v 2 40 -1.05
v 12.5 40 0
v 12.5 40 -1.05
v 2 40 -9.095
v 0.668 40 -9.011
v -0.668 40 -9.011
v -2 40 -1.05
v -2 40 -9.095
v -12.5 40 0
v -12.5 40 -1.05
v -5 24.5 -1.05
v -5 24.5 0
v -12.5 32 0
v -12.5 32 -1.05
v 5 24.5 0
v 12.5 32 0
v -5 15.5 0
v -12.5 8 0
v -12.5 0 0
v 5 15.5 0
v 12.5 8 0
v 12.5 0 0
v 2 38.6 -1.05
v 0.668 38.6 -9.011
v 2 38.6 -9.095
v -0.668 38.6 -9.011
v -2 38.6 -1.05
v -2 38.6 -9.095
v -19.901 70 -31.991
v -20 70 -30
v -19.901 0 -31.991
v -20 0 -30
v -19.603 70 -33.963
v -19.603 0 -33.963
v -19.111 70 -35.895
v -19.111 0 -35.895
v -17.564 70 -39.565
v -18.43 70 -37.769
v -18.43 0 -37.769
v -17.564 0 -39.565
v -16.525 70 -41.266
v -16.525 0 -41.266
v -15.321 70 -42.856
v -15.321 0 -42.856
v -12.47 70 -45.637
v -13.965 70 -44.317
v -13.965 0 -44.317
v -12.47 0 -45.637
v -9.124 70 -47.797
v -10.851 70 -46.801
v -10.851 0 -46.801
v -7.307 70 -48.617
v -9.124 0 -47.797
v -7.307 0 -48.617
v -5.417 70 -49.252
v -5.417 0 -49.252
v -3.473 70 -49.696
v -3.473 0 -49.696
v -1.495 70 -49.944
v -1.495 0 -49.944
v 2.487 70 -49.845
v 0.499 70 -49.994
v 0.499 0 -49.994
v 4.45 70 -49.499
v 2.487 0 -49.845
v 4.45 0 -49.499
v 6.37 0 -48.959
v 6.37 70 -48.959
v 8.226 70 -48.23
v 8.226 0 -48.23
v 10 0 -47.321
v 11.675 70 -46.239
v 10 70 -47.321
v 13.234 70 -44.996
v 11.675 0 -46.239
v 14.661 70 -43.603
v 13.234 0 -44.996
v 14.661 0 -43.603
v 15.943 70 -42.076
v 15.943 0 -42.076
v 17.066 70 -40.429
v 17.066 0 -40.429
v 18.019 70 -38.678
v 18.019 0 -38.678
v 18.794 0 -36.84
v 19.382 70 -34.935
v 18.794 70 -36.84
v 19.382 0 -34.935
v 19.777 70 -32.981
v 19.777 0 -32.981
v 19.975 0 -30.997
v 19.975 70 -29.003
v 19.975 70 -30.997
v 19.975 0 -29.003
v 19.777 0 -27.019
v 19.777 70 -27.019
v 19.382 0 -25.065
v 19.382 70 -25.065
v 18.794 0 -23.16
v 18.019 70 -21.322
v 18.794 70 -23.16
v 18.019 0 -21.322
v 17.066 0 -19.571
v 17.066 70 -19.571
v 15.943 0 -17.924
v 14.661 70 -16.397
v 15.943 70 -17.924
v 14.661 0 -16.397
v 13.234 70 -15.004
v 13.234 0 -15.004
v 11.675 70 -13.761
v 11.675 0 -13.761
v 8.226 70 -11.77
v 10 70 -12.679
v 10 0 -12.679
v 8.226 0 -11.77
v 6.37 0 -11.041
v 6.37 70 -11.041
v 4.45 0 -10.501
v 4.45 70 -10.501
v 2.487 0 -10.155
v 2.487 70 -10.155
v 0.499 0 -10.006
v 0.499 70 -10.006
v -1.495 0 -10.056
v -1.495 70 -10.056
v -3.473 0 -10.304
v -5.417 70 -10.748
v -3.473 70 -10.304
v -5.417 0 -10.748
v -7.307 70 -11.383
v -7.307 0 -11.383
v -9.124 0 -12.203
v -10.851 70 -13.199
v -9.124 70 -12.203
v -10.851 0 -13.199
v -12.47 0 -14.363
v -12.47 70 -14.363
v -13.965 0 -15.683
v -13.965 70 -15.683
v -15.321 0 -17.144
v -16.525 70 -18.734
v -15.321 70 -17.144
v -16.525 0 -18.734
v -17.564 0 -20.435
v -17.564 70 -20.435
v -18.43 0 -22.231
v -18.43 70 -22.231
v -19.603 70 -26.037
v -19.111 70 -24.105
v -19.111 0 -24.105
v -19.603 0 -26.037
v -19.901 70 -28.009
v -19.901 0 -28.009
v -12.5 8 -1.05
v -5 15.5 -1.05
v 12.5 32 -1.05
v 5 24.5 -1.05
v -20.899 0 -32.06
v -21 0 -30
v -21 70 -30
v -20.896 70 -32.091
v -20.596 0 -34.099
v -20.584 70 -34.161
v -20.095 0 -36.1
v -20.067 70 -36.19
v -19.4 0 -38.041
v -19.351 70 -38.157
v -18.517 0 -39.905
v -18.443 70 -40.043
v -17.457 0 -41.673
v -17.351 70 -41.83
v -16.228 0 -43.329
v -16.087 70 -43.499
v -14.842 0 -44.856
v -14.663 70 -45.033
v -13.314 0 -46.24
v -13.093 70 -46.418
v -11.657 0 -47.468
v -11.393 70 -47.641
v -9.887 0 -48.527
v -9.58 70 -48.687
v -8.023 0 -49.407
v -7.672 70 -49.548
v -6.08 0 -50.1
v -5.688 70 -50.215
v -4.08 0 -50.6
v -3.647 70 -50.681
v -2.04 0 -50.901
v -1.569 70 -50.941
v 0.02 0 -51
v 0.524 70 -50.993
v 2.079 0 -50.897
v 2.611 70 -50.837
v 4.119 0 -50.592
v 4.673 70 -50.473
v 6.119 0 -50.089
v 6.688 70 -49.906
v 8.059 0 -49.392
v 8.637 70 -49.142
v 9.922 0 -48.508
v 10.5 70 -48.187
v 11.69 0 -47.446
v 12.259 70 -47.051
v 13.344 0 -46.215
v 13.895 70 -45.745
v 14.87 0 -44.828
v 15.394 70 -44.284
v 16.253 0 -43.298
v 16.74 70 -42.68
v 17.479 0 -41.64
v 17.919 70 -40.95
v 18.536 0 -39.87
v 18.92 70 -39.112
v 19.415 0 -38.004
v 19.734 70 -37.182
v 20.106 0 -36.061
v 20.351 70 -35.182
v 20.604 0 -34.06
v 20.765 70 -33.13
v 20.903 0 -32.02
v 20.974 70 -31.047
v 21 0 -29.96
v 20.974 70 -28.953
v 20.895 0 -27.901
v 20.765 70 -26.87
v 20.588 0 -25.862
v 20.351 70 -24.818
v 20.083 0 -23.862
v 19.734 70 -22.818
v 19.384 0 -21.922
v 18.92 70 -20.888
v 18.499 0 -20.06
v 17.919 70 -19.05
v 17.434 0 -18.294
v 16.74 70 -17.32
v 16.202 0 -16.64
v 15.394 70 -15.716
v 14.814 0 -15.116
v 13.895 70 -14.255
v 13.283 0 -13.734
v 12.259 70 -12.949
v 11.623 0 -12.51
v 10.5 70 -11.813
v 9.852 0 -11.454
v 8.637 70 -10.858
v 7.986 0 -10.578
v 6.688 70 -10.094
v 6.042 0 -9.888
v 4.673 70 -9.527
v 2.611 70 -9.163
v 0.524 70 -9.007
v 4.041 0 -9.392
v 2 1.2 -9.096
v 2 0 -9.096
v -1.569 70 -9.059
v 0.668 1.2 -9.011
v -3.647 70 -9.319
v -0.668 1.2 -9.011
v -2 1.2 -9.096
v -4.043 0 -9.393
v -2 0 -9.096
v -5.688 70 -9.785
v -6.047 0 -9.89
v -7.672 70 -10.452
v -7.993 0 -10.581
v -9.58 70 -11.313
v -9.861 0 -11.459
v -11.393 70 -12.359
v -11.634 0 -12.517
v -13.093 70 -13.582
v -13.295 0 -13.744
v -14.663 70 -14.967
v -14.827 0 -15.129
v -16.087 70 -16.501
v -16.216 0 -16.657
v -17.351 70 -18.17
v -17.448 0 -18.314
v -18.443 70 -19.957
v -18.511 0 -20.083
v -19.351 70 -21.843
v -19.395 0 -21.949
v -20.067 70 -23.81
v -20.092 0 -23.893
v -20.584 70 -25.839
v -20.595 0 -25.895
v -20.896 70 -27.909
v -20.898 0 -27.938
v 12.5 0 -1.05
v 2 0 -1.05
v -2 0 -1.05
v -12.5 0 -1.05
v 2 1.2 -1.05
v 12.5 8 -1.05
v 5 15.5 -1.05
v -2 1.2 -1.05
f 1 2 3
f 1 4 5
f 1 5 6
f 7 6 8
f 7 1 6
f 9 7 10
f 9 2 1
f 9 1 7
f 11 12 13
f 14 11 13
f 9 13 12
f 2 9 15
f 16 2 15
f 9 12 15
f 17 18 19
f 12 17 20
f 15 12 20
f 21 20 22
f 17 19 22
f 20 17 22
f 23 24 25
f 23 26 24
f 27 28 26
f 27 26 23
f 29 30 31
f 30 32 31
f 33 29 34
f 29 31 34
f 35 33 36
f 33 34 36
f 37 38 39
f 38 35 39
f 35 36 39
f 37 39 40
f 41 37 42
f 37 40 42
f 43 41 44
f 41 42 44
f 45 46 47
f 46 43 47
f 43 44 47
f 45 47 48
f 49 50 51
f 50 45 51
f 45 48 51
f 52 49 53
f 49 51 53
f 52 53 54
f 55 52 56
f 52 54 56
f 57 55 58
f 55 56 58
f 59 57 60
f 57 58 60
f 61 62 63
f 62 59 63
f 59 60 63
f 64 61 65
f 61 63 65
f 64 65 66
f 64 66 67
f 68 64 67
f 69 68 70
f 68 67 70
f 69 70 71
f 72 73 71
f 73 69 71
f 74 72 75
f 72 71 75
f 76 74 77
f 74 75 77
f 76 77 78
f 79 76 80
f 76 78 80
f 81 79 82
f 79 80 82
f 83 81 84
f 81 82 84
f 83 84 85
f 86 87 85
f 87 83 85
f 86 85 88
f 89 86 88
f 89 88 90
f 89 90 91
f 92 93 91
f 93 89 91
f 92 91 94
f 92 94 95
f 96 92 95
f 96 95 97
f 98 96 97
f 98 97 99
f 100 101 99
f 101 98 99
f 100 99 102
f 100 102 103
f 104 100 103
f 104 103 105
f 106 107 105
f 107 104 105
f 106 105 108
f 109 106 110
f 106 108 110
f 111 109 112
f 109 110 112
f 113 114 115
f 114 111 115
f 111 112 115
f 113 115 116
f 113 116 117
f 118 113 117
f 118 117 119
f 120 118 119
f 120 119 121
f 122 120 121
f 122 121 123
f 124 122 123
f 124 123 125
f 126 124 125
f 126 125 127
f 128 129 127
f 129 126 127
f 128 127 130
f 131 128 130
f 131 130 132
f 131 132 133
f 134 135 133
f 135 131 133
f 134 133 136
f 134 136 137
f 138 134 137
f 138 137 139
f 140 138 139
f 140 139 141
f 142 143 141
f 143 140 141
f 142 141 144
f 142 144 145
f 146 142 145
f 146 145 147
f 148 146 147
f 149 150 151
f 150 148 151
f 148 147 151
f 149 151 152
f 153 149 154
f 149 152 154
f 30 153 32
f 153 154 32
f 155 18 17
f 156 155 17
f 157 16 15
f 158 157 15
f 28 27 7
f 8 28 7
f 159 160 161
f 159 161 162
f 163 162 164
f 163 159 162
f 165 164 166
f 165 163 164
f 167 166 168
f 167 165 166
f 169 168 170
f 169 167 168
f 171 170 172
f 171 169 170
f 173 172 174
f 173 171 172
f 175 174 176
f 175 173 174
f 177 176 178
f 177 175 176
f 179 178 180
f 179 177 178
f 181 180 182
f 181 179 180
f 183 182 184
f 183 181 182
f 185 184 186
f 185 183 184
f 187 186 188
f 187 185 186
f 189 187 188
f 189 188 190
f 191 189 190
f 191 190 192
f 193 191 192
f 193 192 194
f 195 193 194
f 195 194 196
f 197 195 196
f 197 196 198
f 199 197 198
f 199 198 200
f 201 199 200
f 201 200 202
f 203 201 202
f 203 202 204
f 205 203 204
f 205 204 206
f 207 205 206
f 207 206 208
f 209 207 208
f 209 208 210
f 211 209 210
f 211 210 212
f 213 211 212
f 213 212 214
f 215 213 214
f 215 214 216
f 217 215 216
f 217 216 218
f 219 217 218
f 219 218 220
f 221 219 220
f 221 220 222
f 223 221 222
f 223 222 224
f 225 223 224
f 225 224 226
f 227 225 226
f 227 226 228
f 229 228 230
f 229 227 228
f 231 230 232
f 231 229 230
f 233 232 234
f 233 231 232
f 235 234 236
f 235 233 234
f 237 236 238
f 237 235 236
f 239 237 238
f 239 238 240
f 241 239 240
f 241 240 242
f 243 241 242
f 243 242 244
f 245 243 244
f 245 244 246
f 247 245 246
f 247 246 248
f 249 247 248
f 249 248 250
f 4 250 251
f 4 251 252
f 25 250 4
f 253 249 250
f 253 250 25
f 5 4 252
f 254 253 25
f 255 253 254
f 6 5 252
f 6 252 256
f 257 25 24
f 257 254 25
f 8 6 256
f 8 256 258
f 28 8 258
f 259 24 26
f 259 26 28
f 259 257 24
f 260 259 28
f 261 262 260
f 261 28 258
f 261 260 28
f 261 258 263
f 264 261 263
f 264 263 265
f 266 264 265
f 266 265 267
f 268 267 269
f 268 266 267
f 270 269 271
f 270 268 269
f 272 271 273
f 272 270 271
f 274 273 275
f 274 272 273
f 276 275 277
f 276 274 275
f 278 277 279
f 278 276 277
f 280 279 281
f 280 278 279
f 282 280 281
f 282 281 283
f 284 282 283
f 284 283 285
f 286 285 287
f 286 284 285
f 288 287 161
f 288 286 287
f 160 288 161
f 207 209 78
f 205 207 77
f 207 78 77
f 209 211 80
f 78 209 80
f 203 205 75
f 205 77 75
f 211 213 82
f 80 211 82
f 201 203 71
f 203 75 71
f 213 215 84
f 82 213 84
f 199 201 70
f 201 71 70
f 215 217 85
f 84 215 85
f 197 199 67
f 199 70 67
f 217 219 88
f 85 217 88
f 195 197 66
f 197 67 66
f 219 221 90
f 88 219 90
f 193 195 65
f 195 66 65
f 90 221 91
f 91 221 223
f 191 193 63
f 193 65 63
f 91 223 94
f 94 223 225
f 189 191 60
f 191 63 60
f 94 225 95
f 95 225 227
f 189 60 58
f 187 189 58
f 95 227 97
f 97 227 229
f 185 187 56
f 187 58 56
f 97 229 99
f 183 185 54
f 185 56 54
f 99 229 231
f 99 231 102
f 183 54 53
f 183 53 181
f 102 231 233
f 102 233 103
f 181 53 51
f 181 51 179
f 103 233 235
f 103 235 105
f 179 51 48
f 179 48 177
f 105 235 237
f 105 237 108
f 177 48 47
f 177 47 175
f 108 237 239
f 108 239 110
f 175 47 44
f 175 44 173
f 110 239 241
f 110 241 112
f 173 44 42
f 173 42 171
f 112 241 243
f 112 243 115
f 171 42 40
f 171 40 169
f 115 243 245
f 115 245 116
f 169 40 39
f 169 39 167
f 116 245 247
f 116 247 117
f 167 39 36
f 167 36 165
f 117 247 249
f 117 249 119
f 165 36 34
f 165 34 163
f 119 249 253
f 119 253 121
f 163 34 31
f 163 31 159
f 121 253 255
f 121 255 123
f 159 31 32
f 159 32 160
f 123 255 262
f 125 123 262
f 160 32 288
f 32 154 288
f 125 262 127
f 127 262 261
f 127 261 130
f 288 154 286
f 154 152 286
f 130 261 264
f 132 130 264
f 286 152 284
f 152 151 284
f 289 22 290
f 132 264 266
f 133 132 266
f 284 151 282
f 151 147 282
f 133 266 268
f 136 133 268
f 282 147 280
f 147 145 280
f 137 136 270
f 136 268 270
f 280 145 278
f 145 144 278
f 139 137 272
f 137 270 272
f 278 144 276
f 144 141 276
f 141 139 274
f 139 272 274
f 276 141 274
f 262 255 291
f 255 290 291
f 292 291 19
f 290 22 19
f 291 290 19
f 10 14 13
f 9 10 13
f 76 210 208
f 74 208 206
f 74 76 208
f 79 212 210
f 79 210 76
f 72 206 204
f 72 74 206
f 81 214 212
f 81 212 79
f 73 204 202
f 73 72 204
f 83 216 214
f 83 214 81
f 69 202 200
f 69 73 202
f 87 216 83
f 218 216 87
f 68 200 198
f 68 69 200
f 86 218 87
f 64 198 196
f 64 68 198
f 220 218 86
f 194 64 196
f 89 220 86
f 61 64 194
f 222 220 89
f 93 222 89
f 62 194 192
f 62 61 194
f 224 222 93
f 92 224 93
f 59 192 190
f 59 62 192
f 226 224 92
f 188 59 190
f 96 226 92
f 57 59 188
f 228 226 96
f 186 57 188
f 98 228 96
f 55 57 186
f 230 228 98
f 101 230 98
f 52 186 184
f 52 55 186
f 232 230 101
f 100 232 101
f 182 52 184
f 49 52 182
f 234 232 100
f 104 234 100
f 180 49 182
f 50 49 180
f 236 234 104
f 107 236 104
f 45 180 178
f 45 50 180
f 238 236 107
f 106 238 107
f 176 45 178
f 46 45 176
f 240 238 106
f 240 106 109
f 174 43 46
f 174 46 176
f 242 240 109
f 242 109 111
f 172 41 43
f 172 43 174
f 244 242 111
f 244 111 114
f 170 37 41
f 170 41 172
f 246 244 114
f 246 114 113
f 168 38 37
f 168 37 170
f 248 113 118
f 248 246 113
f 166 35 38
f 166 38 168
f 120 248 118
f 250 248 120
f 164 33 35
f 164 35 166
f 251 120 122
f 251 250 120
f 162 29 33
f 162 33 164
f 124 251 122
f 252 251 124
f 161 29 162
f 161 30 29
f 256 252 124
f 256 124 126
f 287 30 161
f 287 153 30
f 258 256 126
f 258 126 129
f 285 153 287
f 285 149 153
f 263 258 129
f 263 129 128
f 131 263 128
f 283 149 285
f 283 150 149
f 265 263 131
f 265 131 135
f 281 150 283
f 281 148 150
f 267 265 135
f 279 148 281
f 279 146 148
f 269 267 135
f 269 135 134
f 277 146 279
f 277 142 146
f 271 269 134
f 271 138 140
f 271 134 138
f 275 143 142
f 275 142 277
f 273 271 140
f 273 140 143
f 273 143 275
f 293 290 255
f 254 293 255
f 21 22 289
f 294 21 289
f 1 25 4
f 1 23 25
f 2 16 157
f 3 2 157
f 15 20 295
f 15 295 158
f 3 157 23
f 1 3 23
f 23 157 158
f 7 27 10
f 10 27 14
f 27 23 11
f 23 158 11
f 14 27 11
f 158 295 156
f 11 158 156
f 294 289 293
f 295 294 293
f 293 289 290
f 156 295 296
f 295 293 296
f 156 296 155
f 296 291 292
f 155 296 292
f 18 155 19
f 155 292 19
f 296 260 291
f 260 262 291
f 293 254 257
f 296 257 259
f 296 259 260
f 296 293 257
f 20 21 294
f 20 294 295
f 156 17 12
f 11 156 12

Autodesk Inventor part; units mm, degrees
ref_plane "YZ Plane" through (0, 0, 0) normal (1, 0, 0) x (0, 1, 0)
ref_plane "XZ Plane" through (0, 0, 0) normal (0, 1, 0) x (-1, 0, 0)
ref_plane "XY Plane" through (0, 0, 0) normal (0, 0, 1) x (1, 0, 0)
sketch "Szkic1" plane through (0, 0, 0) normal (0, 1, 0) x (-1, 0, 0)
  circle A0 centre (0, -30) radius 20
  line L0 (12.5, 0) -> (-12.5, 0)
  line L1 (-12.5, 0) -> (-12.5, -1.05)
  line L2 (-12.5, -1.05) -> (12.5, -1.05)
  line L3 (12.5, -1.05) -> (12.5, 0)
  circle A1 centre (0, -30) radius 21
  line L4 (-2, -9.0955) -> (2, -9.0955)
  line L5 (2, -9.0955) -> (2, -1.05)
  line L6 (2, -1.05) -> (-2, -1.05)
  line L7 (-2, -1.05) -> (-2, -9.0955)
  point P0 (0, 0)
  point P1 (0, -1.05)
  point P2 (0, 0)
  point P3 (0, -9.0955)
  dimension "d15" = 40
  dimension "d16" = 25
  dimension "d17" = 1.05
  dimension "d18" = 30
  dimension "d19" = 1
  dimension "d20" = 4
extrude "Wyciągnięcie proste1" add sketch "Szkic1" along normal blind 40 contours L3 L2 L1 L0
extrude "Extrusion2" add sketch "Szkic1" along normal blind 1.2 contours L5 A1 L7 L2 | L4 A1 picked at (0.2225, -9.0672)
sketch "Sketch2" plane through (-12.5, 0, 0) normal (0, 0, 1) x (1, 0, 0)
  line L0 (25, 40) -> (0, 40) projected
  line L1 (25, 0) -> (25, 40) projected
  line L2 (0, 40) -> (25, 40)
  line L3 (25, 40) -> (25, 32)
  line L4 (25, 32) -> (13, 20)
  line L5 (25, 8) -> (25, 0)
  line L6 (0, 0) -> (0, 40) projected
  line L7 (25, 0) -> (0, 0)
  line L8 (0, 0) -> (0, 8)
  line L9 (12, 20) -> (0, 32)
  line L10 (0, 32) -> (0, 40)
  line L11 (17.5, 60) -> (27.5, 60) construction
  line L12 (0, 20) -> (25, 20) construction
  line L13 (0, 8) -> (12, 20)
  line L14 (25, 8) -> (13, 20)
  line L15 (12.5, 40) -> (12.5, 0) construction
  line L16 (0, 40) -> (25, 40) construction
  line L17 (0, 0) -> (25, 0) construction
  line L18 (7.5, 15.5) -> (7.5, 24.5)
  line L19 (17.5, 15.5) -> (17.5, 24.5)
  point P0 (0, 32)
  dimension "d24" = 45
  dimension "d26" = 8
  dimension "d48" = 8
  dimension "d49" = 10
extrude "Extrusion3" cut sketch "Sketch2" against normal blind 1.2 contours L1 L14 L19 L4 | L9 L18 L13 L6
sketch "Sketch4" plane through (0, 0, 0) normal (1, 0, 0) x (0, 1, 0)
  line L0 (1.2, -9.0955) -> (1.2, -1.05) projected
  line L1 (38.6, -9.0955) -> (38.6, -1.05)
  line L2 (32, -1.05) -> (40, -1.05) projected
  line L3 (40, -1.05) -> (40, -9.0955)
  line L4 (1.2, -2.7471) -> (1.2, -1.05)
  line L5 (1.2, -1.05) -> (1.2, -9.0955) projected
  line L6 (32, -1.05) -> (24.5, -1.05) projected
  line L7 (40, -9.0955) -> (38.6, -9.0955)
  line L8 (32, -1.05) -> (40, -1.05) projected
  point P0 (0, 0)
  point P1 (1.2, -14.3431)
  point P2 (20, -1.05)
  point P3 (25, -1.05)
  dimension "d32" = 1.4
extrude "Extrusion4" add sketch "Sketch4" along normal mid plane 4
extrude "Extrusion5" add sketch "Szkic1" along normal blind 70 contours L4 A1 | A1 L4
extrude "Wyciągnięcie proste6" cut sketch "Szkic1" along normal blind 70 contours A0
equation "\"d26\" = d48"
equation "\"d35\" = d20"
properties part number "solo_rurka"
